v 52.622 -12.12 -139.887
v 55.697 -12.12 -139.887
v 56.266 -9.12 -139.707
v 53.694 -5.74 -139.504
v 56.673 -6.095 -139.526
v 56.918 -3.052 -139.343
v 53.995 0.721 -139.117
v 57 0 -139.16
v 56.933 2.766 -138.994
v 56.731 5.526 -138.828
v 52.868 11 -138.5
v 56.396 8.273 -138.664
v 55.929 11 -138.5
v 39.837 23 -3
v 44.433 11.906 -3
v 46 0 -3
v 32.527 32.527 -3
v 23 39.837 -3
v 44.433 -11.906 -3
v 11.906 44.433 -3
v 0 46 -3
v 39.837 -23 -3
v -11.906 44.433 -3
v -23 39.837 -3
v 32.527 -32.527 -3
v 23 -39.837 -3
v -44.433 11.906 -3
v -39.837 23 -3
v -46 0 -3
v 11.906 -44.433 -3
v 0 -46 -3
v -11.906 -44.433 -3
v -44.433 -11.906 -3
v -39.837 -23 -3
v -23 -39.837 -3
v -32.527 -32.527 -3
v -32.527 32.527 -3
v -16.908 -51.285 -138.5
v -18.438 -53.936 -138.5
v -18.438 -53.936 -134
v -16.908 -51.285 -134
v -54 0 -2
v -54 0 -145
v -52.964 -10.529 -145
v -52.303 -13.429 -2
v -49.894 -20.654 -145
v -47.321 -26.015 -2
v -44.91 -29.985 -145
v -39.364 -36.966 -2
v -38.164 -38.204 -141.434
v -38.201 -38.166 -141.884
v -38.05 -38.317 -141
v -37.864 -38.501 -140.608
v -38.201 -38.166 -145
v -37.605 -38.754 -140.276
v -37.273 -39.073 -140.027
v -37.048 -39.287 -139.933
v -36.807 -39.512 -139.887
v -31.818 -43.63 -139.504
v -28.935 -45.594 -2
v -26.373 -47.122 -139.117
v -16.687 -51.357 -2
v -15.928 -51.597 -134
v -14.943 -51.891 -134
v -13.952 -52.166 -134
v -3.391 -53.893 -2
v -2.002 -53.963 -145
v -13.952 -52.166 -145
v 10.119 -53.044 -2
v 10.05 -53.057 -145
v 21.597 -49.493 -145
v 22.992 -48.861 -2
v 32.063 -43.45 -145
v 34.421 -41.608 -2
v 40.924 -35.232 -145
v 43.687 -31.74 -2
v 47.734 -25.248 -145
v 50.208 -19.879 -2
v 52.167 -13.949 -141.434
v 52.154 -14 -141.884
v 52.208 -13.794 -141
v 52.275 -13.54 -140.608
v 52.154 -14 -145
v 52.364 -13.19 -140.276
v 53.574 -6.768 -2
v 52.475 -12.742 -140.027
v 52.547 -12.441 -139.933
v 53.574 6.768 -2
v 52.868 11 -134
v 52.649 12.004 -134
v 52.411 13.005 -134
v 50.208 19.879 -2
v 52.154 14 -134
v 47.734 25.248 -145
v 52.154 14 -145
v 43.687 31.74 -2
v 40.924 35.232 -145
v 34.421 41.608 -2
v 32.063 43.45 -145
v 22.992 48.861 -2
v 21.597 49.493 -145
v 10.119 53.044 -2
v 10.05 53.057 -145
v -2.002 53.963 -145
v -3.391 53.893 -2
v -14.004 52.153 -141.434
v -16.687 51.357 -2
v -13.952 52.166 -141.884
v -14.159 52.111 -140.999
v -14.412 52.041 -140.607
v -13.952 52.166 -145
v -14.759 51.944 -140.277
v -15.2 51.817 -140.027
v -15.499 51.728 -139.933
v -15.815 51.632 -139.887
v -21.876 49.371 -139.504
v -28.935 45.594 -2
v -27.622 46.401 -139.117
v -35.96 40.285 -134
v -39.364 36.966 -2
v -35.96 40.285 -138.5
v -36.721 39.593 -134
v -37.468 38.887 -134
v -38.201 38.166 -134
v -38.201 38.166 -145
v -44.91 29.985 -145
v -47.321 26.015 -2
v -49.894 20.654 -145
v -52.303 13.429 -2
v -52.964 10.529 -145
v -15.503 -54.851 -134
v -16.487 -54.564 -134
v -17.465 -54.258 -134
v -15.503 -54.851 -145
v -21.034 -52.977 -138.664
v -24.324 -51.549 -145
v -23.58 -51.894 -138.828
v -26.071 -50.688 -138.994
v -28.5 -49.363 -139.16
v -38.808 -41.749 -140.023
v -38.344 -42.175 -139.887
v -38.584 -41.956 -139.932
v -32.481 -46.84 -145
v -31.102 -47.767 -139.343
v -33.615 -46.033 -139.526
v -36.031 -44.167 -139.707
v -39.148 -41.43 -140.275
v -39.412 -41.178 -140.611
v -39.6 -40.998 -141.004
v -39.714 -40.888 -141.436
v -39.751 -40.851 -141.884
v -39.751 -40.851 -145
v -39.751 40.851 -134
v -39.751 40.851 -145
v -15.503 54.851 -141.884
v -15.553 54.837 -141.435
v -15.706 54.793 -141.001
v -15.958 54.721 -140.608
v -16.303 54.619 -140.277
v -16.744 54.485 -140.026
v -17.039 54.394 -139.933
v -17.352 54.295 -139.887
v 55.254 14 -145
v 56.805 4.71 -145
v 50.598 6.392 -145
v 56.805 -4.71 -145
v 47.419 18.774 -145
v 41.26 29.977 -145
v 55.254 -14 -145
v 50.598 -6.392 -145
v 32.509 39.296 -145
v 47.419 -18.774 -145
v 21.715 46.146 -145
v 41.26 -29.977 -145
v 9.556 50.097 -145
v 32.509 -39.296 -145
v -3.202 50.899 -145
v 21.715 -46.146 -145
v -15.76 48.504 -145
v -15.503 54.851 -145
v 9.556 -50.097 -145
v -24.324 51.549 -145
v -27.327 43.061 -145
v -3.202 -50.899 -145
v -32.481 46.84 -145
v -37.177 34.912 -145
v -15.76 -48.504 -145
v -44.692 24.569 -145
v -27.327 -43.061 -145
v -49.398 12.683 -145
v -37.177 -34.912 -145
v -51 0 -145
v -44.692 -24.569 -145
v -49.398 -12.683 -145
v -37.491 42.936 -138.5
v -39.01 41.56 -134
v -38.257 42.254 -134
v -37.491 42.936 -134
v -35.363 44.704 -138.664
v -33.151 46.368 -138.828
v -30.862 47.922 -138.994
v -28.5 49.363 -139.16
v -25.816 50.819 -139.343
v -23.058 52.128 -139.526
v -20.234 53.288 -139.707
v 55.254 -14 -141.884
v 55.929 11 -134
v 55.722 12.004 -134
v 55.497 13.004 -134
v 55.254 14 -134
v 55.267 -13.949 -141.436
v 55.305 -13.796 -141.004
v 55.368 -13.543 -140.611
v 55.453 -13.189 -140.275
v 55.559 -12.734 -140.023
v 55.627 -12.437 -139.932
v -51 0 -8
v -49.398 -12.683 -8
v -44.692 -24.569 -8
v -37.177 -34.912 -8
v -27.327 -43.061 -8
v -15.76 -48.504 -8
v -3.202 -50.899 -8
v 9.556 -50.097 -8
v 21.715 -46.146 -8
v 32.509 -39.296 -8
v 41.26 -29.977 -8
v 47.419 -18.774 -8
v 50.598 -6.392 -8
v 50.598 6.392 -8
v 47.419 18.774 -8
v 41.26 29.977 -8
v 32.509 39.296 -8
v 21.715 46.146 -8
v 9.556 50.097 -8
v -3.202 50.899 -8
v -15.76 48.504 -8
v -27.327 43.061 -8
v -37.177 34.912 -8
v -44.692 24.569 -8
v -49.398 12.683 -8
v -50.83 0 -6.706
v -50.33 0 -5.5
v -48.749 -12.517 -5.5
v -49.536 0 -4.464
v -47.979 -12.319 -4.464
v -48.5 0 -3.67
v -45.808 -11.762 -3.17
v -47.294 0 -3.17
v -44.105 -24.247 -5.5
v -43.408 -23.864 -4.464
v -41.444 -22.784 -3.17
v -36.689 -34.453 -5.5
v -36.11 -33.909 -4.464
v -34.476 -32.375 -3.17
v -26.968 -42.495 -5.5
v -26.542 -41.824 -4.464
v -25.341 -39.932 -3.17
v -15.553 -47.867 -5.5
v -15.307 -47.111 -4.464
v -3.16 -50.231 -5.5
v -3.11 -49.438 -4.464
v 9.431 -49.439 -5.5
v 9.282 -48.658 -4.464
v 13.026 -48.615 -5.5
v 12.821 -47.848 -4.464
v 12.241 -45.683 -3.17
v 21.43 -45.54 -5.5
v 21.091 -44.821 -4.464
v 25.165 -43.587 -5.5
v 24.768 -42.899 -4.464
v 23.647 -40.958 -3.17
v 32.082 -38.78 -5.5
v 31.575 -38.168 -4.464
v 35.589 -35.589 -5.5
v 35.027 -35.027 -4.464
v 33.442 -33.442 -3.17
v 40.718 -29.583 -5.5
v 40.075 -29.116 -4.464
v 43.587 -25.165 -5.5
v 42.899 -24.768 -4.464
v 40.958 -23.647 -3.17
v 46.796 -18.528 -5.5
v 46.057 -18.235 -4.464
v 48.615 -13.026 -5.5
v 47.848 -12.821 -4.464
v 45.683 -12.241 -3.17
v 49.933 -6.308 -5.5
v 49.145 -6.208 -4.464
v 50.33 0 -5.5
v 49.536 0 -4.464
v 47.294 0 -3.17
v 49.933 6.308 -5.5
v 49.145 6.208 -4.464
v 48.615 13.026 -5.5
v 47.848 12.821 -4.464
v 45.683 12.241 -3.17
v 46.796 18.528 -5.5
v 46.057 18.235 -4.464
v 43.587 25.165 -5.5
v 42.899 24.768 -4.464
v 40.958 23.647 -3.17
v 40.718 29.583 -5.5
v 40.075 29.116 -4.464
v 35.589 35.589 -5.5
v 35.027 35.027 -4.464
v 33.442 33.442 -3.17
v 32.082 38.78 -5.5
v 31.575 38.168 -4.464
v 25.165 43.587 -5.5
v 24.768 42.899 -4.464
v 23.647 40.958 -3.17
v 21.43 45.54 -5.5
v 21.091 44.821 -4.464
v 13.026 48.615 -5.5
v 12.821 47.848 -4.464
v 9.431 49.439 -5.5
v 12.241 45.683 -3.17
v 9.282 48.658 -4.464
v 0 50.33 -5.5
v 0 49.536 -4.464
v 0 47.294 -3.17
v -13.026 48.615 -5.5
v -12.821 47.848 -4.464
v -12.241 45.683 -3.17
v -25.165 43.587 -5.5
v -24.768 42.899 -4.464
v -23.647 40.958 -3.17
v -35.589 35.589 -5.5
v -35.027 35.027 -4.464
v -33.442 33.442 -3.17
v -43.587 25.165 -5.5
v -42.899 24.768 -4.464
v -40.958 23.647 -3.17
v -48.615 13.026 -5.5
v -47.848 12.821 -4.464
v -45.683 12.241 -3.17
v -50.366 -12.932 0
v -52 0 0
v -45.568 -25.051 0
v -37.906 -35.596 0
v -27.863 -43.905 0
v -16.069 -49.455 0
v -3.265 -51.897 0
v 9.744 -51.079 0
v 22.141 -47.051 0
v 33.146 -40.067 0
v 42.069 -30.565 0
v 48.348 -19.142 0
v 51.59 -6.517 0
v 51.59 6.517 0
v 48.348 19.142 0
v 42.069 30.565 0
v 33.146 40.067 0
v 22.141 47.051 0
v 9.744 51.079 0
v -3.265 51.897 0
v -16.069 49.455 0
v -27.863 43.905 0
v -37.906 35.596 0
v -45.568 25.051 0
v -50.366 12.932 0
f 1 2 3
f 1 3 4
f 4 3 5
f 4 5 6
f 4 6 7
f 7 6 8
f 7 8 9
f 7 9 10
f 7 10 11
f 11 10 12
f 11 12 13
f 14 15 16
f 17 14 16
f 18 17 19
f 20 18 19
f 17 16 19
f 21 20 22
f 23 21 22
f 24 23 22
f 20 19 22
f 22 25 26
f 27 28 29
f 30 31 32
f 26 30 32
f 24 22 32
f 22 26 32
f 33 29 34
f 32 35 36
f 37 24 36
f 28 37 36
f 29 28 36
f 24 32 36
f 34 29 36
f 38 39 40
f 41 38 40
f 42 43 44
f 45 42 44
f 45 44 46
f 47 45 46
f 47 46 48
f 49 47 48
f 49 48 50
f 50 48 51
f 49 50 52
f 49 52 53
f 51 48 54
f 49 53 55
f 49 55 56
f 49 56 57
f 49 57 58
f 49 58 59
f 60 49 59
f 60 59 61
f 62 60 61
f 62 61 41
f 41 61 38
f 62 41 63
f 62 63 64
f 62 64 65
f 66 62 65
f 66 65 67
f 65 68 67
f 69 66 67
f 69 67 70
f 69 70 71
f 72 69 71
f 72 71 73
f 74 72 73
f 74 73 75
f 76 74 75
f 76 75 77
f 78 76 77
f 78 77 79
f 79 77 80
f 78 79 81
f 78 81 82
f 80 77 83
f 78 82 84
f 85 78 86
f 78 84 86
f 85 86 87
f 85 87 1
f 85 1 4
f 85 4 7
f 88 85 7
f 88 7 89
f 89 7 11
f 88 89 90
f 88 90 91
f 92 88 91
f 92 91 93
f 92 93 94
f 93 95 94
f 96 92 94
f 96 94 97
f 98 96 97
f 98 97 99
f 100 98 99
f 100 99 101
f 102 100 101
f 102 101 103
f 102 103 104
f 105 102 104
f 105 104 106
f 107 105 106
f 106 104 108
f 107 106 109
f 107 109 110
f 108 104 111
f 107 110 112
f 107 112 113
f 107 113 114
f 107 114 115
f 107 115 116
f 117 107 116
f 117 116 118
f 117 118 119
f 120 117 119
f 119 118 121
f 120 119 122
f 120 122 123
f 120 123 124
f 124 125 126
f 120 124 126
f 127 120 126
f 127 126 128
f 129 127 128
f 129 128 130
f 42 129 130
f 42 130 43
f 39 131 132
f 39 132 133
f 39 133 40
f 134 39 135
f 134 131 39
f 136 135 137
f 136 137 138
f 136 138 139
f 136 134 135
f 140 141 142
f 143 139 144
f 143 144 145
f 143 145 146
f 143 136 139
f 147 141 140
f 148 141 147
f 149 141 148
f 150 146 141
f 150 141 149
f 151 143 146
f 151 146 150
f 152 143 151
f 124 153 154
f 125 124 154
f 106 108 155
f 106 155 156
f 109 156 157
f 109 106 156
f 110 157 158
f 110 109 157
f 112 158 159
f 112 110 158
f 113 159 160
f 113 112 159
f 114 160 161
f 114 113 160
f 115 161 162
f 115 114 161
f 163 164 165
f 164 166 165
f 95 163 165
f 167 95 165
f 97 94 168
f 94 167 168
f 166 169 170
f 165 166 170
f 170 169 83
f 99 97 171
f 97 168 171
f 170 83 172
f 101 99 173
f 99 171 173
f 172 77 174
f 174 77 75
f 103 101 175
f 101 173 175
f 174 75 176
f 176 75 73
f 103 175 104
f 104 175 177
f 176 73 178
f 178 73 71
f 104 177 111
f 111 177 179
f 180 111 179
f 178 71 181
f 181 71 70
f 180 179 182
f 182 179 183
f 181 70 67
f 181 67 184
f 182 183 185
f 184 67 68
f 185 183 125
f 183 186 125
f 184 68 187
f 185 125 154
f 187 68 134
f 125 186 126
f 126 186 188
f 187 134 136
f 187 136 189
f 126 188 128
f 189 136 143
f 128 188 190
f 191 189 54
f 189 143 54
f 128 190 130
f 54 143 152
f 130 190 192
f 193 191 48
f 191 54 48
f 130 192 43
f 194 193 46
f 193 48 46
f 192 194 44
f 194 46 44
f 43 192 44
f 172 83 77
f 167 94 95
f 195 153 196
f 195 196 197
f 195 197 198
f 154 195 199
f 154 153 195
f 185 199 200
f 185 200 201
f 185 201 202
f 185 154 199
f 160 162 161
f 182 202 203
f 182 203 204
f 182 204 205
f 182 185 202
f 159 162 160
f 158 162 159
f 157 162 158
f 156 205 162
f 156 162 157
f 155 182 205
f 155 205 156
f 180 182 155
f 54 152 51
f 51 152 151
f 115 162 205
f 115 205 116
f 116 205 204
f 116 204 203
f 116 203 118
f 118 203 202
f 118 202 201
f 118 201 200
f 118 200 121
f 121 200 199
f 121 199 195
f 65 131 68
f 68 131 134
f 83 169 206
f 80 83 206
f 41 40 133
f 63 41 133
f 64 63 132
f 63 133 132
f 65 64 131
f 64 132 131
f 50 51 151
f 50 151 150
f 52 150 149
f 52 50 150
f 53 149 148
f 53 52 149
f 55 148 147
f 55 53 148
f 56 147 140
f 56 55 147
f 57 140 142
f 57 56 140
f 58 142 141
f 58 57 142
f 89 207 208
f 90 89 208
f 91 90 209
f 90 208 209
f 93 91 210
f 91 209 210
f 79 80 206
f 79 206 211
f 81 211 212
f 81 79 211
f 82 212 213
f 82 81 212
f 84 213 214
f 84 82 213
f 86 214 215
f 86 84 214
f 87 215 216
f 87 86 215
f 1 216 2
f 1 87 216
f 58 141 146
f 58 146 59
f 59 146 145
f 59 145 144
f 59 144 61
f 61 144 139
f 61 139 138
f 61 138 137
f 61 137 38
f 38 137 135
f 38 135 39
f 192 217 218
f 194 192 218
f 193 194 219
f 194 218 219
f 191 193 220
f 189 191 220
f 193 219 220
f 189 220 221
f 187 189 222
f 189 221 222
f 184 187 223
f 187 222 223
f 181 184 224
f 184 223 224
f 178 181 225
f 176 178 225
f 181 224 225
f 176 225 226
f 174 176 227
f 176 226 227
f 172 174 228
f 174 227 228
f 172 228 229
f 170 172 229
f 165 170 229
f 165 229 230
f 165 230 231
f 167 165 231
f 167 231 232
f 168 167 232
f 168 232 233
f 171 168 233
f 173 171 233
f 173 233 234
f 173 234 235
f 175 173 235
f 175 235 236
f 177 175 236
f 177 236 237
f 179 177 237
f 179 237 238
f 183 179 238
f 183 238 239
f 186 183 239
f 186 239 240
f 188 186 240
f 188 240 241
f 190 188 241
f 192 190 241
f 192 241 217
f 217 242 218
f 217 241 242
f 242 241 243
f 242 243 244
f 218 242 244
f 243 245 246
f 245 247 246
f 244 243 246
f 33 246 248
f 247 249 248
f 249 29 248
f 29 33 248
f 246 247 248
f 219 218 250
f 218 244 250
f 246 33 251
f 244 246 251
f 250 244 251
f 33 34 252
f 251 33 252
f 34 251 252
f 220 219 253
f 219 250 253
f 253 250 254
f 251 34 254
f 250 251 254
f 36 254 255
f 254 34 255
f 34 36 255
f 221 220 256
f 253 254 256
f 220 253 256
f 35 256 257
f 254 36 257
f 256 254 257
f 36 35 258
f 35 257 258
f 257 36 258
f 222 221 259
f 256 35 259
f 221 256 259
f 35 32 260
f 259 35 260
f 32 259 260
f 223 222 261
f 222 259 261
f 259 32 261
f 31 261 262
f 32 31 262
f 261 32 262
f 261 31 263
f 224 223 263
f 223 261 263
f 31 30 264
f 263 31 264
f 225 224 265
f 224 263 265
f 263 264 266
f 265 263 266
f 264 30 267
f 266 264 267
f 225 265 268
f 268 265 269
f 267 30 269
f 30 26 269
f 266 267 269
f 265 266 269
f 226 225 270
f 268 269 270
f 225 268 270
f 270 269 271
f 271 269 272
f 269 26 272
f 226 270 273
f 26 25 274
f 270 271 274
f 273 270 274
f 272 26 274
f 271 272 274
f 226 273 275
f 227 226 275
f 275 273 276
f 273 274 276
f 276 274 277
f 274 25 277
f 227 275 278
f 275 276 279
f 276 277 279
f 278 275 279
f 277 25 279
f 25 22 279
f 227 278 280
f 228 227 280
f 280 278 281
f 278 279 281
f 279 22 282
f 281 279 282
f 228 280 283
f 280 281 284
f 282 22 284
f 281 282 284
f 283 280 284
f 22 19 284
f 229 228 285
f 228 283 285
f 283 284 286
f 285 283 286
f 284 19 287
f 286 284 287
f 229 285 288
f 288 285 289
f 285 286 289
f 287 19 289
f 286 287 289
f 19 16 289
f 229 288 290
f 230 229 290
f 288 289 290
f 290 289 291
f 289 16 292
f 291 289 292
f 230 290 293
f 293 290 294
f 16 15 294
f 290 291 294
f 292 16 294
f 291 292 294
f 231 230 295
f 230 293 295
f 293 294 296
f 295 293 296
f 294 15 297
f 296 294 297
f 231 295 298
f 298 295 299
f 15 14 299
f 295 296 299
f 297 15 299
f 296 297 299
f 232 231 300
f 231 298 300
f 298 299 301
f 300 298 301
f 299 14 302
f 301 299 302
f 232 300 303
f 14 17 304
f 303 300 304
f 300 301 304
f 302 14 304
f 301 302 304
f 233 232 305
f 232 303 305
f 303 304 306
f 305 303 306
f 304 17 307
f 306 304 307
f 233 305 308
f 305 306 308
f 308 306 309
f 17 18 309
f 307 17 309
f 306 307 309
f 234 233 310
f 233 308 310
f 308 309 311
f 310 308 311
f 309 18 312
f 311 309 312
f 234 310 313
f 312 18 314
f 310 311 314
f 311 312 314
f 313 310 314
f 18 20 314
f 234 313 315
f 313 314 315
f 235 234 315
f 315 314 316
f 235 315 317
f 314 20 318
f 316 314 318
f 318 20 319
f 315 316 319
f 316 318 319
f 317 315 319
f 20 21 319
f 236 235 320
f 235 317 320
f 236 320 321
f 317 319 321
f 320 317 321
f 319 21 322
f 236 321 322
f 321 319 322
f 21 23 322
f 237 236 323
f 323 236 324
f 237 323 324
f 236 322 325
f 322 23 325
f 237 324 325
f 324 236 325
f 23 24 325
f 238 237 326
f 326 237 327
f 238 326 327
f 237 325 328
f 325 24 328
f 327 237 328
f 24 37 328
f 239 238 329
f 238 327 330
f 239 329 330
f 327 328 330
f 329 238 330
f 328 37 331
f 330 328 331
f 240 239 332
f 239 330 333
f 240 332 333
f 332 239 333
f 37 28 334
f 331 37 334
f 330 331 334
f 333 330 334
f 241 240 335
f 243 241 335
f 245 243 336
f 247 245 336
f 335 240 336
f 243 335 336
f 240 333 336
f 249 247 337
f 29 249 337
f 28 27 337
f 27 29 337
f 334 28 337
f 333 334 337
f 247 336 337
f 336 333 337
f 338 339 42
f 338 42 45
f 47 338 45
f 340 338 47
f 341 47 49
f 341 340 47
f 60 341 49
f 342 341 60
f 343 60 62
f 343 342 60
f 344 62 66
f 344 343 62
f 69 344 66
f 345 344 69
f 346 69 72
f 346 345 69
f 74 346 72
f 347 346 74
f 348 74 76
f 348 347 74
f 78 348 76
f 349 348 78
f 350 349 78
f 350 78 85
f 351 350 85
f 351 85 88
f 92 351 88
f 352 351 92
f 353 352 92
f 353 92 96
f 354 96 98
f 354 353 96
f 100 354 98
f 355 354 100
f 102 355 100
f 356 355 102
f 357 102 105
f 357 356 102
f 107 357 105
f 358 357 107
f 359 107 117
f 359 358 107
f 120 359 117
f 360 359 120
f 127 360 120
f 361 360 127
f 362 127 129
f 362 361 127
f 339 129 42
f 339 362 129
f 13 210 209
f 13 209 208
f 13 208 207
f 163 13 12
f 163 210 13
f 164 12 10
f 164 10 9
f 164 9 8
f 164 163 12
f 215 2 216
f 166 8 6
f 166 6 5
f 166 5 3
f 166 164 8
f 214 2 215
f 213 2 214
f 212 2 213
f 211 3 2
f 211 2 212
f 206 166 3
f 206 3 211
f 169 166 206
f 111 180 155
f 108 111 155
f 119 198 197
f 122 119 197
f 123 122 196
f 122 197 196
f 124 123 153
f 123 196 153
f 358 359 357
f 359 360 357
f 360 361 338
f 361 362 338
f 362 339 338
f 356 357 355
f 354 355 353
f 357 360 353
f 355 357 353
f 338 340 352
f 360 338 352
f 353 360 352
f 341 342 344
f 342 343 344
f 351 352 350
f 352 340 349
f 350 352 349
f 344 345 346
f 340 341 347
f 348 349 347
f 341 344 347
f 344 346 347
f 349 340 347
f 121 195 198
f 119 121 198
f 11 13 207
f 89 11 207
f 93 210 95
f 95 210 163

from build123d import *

# Parameters (mm, degrees)
EXTRUDE_1_DEPTH                  = 10
FILLET_1_R                       = 2
PATTERN_CIRCULAR_2_COUNT         = 3
FILLET_1_OF_PATTERN_CIRCULAR_2_R = 2
CUT_EXTRUDE_START                = -15
SKETCH_3_R                       = 51
CUT_EXTRUDE_1_DEPTH              = 15
SKETCH_4_R                       = 62.618720145
SKETCH_4_R_2                     = 57
CUT_EXTRUDE_2_DEPTH              = 15
CHAMFER_1_SIZE                   = 2
FILLET_2_R                       = 5


with BuildPart() as part:
    # Эскиз1 → Повернуть1 (revolve)
    with BuildSketch(Plane(origin=(0, 0, 0), x_dir=(1, 0, 0), z_dir=(0, 1, 0))):
        Polygon((0, 0), (-54, 0), (-54, 145), (-51, 145), (-51, 3), (0, 3), align=None)
    revolve(axis=Axis((0, 0, -3), (0, 0, 1)))

    # Эскиз2 → Бобышка-Вытянуть1 (add)
    with BuildSketch(Plane(origin=(57, 0, 0), x_dir=(0, 0, -1), z_dir=(1, 0, 0))):
        Polygon((145, 14), (145, -14), (140, -14), (138.5, 11), (134, 11), (134, 14), align=None)
    extrude_1 = extrude(amount=-EXTRUDE_1_DEPTH)

    # Скругление1
    fillet_1_edges = [part.edges().sort_by_distance(p)[0] for p in [
        (54.576809621, -14, -140),
    ]]
    fillet(fillet_1_edges, radius=FILLET_1_R)

    # Круговой массив2: Бобышка-Вытянуть1 ×3 about axis
    pattern_circular_2_axis = Axis((0, 0, 0), (0, 0, 1))
    for i in range(1, PATTERN_CIRCULAR_2_COUNT):
        add(extrude_1.rotate(pattern_circular_2_axis, i * 360 / PATTERN_CIRCULAR_2_COUNT))

    # Скругление1 of Круговой массив2
    fillet_1_of_pattern_circular_2_edges = [part.edges().sort_by_distance(p)[0] for p in [
        (-15.164049157, 54.264903589, -140),
        (-39.412760463, -40.264903589, -140),
    ]]
    fillet(fillet_1_of_pattern_circular_2_edges, radius=FILLET_1_OF_PATTERN_CIRCULAR_2_R)

    # Эскиз3 → Вырез-Вытянуть1 (cut)
    with BuildSketch(Plane(origin=(0, 0, -145), x_dir=(-1, 0, 0), z_dir=(0, 0, -1)).offset(CUT_EXTRUDE_START)):
        Circle(SKETCH_3_R)
    extrude(amount=CUT_EXTRUDE_1_DEPTH, mode=Mode.SUBTRACT)

    # Эскиз4 → Вырез-Вытянуть2 (cut)
    with BuildSketch(Plane(origin=(0, 0, -145), x_dir=(-1, 0, 0), z_dir=(0, 0, -1))):
        Circle(SKETCH_4_R)
        Circle(SKETCH_4_R_2, mode=Mode.SUBTRACT)
    extrude(amount=-CUT_EXTRUDE_2_DEPTH, mode=Mode.SUBTRACT)

    # Фаска1
    chamfer_1_edges = [part.edges().sort_by_distance(p)[0] for p in [
        (54, 0, 0),
    ]]
    chamfer(chamfer_1_edges, length=CHAMFER_1_SIZE)

    # Скругление2
    fillet_2_edges = [part.edges().sort_by_distance(p)[0] for p in [
        (51, 0, -3),
    ]]
    fillet(fillet_2_edges, radius=FILLET_2_R)


solid = part.part
